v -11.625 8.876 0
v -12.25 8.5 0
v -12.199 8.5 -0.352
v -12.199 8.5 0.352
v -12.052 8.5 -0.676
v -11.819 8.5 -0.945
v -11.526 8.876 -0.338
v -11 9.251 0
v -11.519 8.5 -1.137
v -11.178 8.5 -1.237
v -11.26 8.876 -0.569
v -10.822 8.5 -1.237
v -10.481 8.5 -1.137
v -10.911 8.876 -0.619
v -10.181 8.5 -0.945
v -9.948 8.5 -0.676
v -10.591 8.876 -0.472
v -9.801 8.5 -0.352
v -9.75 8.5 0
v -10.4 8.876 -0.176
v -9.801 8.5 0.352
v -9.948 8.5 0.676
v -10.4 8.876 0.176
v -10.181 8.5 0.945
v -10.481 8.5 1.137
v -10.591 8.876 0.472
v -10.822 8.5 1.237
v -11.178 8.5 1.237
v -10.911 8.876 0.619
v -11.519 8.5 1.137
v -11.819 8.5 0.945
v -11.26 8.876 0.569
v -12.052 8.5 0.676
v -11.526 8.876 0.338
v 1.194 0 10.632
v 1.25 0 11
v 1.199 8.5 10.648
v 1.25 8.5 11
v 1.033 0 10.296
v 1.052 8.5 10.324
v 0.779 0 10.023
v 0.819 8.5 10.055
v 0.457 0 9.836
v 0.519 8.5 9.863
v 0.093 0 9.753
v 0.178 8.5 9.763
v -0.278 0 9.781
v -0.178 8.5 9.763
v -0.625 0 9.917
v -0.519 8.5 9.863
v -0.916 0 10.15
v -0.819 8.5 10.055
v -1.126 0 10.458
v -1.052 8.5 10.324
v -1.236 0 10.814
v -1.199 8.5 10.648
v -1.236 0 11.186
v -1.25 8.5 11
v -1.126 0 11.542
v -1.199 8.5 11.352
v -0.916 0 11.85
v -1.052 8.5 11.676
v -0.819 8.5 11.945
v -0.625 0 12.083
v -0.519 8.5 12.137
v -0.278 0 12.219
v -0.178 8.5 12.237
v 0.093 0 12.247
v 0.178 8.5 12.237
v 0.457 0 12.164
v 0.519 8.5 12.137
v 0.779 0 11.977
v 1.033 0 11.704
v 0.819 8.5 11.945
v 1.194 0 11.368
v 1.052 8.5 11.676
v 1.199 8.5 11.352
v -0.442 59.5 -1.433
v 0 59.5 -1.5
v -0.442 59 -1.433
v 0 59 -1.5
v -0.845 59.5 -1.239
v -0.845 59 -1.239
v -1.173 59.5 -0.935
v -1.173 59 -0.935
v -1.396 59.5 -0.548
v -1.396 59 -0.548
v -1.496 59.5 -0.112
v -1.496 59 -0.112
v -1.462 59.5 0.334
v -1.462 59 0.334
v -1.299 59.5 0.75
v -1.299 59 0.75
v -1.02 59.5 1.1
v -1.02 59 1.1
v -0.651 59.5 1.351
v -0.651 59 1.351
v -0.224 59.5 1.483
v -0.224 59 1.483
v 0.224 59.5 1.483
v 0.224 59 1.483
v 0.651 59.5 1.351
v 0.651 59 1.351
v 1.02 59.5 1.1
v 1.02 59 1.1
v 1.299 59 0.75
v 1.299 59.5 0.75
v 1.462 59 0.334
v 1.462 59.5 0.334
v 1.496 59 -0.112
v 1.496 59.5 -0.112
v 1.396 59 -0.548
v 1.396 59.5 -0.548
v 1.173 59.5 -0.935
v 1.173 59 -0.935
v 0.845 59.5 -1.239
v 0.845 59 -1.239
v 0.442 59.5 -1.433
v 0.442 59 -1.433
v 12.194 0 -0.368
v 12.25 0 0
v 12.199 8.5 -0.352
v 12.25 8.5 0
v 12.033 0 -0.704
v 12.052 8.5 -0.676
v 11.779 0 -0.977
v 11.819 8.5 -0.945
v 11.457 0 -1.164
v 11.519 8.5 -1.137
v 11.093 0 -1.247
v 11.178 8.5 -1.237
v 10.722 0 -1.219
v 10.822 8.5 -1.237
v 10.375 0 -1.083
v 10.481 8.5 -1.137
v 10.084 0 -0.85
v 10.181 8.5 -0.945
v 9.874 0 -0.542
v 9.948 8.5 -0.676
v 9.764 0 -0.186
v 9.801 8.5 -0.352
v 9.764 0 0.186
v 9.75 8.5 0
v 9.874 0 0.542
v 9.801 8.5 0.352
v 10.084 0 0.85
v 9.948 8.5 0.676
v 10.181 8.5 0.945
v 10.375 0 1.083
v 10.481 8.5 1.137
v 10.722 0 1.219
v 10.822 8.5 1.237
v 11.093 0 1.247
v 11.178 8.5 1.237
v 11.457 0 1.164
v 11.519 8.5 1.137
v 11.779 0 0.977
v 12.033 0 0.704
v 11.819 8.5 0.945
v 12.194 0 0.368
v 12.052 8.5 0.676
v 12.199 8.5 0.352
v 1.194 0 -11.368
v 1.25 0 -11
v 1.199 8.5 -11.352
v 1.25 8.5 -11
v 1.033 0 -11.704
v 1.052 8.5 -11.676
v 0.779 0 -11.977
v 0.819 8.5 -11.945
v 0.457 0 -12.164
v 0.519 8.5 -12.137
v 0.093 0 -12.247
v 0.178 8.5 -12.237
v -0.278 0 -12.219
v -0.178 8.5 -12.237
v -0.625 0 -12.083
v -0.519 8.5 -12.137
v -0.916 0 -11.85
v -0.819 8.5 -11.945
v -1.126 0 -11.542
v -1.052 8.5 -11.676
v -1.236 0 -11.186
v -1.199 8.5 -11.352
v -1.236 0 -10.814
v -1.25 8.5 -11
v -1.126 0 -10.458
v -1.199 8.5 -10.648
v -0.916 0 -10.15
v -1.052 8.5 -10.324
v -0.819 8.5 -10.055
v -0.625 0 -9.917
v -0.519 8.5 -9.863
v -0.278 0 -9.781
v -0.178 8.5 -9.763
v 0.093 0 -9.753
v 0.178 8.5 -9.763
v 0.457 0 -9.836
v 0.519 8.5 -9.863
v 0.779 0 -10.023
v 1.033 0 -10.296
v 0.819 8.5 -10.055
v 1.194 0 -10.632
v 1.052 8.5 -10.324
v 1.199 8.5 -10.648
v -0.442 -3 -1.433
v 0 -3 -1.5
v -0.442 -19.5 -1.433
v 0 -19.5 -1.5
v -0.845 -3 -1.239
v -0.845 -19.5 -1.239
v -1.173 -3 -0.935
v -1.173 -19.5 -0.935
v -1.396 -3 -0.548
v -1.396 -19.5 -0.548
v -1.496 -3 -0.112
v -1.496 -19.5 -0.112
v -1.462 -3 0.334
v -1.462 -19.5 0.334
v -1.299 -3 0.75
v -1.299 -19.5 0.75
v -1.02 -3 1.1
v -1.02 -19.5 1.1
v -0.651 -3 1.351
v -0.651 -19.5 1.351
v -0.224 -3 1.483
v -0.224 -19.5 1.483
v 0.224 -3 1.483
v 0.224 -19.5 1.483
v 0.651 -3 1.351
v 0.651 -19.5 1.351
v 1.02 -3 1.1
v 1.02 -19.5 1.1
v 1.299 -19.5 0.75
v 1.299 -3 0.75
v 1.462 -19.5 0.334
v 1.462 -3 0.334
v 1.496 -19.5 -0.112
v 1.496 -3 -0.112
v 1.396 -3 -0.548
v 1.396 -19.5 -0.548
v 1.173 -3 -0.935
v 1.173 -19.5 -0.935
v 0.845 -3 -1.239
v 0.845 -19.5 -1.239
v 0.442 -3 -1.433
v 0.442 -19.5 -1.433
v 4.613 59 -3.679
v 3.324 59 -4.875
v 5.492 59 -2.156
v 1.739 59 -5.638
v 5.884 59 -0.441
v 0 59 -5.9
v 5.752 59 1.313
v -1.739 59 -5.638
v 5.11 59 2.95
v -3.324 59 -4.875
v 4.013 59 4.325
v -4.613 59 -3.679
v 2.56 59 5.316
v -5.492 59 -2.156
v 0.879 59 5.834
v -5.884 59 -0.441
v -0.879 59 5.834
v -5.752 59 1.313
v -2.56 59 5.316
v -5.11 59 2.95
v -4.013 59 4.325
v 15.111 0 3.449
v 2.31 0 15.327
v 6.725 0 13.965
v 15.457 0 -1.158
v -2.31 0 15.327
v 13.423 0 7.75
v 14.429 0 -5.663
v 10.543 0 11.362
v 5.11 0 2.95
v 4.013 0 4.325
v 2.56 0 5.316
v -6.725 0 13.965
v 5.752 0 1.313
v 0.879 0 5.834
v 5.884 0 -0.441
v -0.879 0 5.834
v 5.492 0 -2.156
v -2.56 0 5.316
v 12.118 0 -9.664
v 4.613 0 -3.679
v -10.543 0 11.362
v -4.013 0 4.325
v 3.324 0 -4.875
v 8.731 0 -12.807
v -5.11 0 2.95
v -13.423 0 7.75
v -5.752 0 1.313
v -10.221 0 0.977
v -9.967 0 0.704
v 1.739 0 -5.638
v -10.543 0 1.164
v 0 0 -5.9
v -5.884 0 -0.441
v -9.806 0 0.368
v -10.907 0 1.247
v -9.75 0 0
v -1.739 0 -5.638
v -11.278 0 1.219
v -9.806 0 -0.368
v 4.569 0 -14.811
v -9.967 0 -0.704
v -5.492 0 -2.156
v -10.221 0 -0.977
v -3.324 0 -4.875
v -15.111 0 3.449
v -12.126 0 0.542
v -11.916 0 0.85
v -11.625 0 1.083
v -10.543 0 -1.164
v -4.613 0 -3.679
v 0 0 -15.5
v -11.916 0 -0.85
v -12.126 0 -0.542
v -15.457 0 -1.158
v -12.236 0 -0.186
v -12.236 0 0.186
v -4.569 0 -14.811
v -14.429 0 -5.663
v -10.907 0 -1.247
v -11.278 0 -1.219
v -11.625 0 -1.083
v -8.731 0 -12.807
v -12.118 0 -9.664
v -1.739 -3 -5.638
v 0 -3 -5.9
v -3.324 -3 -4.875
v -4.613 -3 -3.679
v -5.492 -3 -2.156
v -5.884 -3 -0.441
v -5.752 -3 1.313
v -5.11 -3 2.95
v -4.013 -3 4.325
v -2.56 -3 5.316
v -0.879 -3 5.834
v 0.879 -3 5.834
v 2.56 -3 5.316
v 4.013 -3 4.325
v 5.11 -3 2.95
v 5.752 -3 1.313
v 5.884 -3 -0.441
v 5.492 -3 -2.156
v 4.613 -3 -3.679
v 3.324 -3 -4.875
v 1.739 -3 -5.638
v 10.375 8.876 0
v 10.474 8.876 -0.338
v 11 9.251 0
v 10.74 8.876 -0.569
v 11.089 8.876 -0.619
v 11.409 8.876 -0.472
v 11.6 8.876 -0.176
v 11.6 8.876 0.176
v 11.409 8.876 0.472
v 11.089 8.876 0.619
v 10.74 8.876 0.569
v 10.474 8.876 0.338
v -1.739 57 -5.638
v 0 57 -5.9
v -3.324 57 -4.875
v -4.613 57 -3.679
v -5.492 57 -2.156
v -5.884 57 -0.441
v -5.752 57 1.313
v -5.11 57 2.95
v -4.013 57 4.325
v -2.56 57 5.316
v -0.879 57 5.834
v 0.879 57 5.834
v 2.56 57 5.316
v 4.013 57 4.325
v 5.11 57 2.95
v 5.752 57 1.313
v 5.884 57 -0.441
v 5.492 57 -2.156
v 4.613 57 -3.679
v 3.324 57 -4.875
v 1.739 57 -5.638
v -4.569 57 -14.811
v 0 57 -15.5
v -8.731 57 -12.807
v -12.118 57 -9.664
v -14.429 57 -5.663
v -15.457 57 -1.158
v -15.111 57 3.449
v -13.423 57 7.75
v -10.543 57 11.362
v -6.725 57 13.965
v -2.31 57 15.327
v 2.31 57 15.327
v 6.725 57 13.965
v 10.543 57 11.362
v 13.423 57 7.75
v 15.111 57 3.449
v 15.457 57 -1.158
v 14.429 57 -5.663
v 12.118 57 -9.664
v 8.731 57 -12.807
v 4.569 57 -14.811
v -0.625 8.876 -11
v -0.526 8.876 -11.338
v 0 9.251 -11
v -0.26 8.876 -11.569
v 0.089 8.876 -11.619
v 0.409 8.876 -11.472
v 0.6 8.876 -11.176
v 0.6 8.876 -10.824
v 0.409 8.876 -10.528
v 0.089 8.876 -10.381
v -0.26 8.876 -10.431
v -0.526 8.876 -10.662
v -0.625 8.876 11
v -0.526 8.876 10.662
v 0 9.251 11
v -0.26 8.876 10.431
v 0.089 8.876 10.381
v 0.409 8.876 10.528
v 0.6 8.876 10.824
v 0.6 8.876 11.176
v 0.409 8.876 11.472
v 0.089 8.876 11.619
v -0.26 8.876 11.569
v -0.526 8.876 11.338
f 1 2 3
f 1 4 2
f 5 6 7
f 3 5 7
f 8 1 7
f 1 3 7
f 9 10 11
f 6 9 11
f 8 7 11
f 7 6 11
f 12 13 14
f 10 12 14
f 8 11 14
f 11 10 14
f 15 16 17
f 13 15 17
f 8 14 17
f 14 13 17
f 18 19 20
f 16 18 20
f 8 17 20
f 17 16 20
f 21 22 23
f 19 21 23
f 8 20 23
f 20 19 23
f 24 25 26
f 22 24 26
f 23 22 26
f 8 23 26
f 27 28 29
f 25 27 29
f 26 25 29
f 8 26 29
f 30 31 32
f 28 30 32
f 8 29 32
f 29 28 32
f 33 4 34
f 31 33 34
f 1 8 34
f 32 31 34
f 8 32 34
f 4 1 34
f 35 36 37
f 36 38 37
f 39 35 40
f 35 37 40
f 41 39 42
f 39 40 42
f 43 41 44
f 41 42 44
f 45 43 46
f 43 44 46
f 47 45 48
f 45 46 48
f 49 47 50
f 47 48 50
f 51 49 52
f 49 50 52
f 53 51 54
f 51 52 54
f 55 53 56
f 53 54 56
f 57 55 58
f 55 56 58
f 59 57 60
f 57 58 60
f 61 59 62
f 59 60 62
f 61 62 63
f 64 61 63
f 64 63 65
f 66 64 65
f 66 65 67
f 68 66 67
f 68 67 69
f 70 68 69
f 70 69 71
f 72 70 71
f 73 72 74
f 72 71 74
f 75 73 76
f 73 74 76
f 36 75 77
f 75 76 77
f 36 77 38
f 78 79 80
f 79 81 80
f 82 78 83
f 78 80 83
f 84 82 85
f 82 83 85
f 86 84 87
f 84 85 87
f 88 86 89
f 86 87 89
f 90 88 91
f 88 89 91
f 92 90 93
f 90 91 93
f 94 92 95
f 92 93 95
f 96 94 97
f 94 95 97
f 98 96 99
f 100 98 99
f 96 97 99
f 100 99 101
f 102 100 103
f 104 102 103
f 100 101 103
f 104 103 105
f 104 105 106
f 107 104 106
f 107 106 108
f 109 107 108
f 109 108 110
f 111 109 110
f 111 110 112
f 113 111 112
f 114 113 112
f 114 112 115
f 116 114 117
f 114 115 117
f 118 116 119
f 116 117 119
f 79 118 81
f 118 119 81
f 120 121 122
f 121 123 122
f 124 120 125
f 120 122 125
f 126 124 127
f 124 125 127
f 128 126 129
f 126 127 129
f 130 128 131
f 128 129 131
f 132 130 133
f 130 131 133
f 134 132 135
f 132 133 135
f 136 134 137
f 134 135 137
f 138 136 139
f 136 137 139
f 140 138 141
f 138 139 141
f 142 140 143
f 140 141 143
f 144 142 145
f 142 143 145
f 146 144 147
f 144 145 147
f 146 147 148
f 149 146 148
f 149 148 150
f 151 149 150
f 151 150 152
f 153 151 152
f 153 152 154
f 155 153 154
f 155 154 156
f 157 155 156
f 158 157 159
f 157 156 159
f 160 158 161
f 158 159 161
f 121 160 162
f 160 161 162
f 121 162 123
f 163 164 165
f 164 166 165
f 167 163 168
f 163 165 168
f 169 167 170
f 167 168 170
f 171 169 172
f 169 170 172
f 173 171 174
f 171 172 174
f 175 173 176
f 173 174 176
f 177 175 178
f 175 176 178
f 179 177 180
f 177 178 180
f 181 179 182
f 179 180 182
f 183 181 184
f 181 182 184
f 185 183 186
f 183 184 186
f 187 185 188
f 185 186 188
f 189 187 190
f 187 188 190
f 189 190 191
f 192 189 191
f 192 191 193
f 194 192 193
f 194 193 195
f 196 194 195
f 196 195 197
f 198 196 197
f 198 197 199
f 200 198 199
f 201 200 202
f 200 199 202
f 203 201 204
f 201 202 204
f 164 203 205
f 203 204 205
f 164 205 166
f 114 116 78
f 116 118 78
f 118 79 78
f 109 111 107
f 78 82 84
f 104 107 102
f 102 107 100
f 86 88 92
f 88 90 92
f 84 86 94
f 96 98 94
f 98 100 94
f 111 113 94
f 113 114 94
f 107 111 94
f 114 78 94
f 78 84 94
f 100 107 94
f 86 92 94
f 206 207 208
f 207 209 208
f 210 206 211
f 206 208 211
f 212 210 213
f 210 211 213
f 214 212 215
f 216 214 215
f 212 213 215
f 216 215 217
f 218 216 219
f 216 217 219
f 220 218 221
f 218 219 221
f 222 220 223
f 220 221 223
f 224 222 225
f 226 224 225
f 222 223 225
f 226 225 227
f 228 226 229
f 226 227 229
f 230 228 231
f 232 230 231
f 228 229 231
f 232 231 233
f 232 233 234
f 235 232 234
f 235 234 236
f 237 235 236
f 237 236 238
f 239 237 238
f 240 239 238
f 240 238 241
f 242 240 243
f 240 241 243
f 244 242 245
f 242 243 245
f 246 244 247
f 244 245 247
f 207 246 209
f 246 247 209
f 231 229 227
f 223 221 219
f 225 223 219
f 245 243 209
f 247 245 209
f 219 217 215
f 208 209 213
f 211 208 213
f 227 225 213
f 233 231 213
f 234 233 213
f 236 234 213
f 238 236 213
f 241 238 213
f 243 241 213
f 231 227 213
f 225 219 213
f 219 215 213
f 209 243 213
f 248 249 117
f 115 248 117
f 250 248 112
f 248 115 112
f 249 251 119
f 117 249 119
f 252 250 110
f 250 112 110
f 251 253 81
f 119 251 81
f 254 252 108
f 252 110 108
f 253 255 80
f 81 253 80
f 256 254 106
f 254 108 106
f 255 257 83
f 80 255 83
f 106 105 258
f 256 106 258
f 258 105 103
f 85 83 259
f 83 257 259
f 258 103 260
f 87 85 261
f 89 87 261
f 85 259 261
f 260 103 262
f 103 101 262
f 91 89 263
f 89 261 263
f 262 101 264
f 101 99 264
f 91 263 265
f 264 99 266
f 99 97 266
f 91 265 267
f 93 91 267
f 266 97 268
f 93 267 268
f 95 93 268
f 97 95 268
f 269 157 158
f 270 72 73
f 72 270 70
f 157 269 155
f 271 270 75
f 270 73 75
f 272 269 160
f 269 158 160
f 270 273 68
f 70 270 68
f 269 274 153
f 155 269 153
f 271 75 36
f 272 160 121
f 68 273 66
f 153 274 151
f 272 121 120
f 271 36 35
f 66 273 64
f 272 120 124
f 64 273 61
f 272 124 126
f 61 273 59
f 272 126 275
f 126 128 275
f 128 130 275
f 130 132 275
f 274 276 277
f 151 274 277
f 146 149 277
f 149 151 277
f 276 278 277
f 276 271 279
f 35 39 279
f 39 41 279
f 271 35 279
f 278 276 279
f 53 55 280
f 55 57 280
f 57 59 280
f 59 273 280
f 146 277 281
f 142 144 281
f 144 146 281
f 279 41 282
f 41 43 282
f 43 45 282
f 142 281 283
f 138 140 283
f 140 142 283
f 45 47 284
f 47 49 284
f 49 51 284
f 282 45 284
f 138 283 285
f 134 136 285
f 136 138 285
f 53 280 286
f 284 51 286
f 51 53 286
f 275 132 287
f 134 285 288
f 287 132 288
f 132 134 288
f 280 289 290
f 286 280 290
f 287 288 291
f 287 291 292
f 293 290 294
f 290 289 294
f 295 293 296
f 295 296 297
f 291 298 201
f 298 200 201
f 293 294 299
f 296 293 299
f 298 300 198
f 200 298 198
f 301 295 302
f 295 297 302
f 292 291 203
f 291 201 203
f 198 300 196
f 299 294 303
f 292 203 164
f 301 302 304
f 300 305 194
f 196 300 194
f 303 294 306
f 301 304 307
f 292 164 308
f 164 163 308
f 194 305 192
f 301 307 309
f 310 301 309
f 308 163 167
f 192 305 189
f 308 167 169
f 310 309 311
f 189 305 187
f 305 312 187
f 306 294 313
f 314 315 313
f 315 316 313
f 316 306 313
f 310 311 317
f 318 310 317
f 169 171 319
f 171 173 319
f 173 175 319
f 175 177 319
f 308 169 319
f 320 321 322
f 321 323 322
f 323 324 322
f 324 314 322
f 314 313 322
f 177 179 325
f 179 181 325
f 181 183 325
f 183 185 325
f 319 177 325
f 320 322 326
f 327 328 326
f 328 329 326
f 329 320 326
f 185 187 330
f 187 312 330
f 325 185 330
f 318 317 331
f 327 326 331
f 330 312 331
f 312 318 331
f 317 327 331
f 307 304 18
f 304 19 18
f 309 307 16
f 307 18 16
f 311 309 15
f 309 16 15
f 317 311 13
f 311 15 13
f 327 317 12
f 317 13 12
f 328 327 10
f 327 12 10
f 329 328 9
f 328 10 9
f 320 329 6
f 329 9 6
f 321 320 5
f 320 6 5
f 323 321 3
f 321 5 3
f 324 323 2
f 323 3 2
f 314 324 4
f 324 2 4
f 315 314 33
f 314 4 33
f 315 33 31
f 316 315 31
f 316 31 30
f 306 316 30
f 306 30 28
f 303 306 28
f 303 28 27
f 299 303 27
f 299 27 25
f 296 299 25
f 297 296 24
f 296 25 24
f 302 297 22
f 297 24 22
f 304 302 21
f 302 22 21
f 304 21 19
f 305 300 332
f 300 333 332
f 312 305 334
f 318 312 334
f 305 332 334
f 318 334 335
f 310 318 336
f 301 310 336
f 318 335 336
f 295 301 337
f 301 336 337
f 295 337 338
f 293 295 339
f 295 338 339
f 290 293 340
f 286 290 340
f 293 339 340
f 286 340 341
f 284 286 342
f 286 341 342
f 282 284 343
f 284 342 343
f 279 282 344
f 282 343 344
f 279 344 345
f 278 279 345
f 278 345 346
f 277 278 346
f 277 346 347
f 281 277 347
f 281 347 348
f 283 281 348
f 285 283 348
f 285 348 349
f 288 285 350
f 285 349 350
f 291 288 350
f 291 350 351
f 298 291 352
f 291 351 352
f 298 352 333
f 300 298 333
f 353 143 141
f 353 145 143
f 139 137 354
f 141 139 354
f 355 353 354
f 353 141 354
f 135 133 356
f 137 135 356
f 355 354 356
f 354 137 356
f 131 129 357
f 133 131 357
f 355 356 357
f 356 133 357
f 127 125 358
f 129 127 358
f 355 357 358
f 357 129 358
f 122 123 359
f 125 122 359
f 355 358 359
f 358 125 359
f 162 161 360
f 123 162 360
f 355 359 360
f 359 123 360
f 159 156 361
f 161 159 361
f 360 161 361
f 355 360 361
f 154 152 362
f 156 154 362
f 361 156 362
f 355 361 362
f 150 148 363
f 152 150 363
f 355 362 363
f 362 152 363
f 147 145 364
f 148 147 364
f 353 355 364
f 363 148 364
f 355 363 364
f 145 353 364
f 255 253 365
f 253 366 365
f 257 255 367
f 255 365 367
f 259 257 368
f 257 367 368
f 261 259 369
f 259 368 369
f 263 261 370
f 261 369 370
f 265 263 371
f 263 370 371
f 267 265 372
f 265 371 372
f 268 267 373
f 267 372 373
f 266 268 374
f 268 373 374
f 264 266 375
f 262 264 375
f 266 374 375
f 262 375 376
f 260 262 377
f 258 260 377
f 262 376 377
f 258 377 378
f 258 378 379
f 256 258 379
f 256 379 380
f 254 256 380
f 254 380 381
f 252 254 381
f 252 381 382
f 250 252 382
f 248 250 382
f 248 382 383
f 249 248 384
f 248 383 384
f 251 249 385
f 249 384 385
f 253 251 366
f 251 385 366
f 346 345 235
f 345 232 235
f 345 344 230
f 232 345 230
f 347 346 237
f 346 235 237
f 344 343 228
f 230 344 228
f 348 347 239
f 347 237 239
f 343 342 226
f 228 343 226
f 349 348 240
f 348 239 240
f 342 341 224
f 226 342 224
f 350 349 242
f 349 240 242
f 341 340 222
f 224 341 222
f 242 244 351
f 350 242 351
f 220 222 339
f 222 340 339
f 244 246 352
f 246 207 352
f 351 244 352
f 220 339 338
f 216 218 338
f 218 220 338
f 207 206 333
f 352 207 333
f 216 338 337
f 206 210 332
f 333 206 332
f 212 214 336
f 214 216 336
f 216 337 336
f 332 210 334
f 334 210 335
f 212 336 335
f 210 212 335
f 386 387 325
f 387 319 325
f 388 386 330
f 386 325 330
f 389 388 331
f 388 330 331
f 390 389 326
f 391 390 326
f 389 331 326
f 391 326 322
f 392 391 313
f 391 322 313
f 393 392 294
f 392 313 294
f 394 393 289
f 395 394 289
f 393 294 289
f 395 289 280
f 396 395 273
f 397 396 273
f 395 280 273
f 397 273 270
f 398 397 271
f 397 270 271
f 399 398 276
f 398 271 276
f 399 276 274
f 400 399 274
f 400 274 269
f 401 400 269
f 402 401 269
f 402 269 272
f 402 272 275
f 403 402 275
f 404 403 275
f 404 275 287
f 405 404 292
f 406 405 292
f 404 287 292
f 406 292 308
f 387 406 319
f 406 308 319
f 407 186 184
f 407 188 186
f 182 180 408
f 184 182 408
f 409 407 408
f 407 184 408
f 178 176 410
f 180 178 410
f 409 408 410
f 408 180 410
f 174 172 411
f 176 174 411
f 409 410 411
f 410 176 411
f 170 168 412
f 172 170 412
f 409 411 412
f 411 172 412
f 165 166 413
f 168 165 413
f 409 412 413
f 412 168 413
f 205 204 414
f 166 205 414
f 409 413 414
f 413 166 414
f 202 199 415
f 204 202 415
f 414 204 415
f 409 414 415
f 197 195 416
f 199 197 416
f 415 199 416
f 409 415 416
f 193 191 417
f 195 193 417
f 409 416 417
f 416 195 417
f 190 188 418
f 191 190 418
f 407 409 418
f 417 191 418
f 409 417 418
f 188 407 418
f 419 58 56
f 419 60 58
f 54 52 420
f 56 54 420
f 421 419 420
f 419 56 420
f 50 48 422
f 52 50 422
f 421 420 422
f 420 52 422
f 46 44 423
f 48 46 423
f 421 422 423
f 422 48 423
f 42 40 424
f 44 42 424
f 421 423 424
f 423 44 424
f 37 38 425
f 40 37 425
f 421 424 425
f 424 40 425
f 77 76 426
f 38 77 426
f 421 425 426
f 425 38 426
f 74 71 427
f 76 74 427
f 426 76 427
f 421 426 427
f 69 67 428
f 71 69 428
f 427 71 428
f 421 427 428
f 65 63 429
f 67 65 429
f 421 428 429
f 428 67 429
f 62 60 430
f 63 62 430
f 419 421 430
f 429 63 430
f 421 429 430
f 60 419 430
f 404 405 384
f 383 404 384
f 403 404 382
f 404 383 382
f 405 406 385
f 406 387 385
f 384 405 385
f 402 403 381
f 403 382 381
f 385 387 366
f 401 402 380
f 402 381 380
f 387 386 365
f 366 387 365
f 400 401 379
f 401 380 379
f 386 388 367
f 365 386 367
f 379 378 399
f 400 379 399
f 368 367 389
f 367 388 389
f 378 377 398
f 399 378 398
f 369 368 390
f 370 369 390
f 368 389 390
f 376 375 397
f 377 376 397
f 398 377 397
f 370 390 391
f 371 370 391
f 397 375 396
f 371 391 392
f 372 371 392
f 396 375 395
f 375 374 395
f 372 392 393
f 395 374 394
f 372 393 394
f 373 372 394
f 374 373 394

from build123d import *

# Parameters (mm, degrees)
TROU_TARAUD_M3X0_51_D     = 2.5
TROU_TARAUD_M3X0_51_DEPTH = 8.5
TROU_TARAUD_M3X0_51_TIP   = 0.751075774


with BuildPart() as part:
    # Esquisse1 → Révolution1 (revolve)
    with BuildSketch(Plane.XY, mode=Mode.PRIVATE) as r_volution1_sk:
        Polygon((0, -19.5), (0, 59.5), (1.5, 59.5), (1.5, 59), (5.9, 59), (5.9, 57), (15.5, 57), (15.5, 0), (5.9, 0), (5.9, -3), (1.5, -3), (1.5, -19.5), align=None)
    revolve(r_volution1_sk.sketch.rotate(Axis((0, 0, 0), (0, 1, 0)), 90), axis=Axis((0, 0, 0), (0, 1, 0)))

    # Trou taraudé M3x0.51
    with Locations(Plane(origin=(0, 0, 0), x_dir=(-1, 0, 0), z_dir=(0, -1, 0))):
        with Locations((0, -11), (-11, 0), (0, 11), (11, 0)):
            Hole(TROU_TARAUD_M3X0_51_D / 2, depth=TROU_TARAUD_M3X0_51_DEPTH)
            with Locations((0, 0, -(TROU_TARAUD_M3X0_51_DEPTH + TROU_TARAUD_M3X0_51_TIP / 2))):  # 118° drill point
                Cone(0, TROU_TARAUD_M3X0_51_D / 2, TROU_TARAUD_M3X0_51_TIP, mode=Mode.SUBTRACT)


solid = part.part
